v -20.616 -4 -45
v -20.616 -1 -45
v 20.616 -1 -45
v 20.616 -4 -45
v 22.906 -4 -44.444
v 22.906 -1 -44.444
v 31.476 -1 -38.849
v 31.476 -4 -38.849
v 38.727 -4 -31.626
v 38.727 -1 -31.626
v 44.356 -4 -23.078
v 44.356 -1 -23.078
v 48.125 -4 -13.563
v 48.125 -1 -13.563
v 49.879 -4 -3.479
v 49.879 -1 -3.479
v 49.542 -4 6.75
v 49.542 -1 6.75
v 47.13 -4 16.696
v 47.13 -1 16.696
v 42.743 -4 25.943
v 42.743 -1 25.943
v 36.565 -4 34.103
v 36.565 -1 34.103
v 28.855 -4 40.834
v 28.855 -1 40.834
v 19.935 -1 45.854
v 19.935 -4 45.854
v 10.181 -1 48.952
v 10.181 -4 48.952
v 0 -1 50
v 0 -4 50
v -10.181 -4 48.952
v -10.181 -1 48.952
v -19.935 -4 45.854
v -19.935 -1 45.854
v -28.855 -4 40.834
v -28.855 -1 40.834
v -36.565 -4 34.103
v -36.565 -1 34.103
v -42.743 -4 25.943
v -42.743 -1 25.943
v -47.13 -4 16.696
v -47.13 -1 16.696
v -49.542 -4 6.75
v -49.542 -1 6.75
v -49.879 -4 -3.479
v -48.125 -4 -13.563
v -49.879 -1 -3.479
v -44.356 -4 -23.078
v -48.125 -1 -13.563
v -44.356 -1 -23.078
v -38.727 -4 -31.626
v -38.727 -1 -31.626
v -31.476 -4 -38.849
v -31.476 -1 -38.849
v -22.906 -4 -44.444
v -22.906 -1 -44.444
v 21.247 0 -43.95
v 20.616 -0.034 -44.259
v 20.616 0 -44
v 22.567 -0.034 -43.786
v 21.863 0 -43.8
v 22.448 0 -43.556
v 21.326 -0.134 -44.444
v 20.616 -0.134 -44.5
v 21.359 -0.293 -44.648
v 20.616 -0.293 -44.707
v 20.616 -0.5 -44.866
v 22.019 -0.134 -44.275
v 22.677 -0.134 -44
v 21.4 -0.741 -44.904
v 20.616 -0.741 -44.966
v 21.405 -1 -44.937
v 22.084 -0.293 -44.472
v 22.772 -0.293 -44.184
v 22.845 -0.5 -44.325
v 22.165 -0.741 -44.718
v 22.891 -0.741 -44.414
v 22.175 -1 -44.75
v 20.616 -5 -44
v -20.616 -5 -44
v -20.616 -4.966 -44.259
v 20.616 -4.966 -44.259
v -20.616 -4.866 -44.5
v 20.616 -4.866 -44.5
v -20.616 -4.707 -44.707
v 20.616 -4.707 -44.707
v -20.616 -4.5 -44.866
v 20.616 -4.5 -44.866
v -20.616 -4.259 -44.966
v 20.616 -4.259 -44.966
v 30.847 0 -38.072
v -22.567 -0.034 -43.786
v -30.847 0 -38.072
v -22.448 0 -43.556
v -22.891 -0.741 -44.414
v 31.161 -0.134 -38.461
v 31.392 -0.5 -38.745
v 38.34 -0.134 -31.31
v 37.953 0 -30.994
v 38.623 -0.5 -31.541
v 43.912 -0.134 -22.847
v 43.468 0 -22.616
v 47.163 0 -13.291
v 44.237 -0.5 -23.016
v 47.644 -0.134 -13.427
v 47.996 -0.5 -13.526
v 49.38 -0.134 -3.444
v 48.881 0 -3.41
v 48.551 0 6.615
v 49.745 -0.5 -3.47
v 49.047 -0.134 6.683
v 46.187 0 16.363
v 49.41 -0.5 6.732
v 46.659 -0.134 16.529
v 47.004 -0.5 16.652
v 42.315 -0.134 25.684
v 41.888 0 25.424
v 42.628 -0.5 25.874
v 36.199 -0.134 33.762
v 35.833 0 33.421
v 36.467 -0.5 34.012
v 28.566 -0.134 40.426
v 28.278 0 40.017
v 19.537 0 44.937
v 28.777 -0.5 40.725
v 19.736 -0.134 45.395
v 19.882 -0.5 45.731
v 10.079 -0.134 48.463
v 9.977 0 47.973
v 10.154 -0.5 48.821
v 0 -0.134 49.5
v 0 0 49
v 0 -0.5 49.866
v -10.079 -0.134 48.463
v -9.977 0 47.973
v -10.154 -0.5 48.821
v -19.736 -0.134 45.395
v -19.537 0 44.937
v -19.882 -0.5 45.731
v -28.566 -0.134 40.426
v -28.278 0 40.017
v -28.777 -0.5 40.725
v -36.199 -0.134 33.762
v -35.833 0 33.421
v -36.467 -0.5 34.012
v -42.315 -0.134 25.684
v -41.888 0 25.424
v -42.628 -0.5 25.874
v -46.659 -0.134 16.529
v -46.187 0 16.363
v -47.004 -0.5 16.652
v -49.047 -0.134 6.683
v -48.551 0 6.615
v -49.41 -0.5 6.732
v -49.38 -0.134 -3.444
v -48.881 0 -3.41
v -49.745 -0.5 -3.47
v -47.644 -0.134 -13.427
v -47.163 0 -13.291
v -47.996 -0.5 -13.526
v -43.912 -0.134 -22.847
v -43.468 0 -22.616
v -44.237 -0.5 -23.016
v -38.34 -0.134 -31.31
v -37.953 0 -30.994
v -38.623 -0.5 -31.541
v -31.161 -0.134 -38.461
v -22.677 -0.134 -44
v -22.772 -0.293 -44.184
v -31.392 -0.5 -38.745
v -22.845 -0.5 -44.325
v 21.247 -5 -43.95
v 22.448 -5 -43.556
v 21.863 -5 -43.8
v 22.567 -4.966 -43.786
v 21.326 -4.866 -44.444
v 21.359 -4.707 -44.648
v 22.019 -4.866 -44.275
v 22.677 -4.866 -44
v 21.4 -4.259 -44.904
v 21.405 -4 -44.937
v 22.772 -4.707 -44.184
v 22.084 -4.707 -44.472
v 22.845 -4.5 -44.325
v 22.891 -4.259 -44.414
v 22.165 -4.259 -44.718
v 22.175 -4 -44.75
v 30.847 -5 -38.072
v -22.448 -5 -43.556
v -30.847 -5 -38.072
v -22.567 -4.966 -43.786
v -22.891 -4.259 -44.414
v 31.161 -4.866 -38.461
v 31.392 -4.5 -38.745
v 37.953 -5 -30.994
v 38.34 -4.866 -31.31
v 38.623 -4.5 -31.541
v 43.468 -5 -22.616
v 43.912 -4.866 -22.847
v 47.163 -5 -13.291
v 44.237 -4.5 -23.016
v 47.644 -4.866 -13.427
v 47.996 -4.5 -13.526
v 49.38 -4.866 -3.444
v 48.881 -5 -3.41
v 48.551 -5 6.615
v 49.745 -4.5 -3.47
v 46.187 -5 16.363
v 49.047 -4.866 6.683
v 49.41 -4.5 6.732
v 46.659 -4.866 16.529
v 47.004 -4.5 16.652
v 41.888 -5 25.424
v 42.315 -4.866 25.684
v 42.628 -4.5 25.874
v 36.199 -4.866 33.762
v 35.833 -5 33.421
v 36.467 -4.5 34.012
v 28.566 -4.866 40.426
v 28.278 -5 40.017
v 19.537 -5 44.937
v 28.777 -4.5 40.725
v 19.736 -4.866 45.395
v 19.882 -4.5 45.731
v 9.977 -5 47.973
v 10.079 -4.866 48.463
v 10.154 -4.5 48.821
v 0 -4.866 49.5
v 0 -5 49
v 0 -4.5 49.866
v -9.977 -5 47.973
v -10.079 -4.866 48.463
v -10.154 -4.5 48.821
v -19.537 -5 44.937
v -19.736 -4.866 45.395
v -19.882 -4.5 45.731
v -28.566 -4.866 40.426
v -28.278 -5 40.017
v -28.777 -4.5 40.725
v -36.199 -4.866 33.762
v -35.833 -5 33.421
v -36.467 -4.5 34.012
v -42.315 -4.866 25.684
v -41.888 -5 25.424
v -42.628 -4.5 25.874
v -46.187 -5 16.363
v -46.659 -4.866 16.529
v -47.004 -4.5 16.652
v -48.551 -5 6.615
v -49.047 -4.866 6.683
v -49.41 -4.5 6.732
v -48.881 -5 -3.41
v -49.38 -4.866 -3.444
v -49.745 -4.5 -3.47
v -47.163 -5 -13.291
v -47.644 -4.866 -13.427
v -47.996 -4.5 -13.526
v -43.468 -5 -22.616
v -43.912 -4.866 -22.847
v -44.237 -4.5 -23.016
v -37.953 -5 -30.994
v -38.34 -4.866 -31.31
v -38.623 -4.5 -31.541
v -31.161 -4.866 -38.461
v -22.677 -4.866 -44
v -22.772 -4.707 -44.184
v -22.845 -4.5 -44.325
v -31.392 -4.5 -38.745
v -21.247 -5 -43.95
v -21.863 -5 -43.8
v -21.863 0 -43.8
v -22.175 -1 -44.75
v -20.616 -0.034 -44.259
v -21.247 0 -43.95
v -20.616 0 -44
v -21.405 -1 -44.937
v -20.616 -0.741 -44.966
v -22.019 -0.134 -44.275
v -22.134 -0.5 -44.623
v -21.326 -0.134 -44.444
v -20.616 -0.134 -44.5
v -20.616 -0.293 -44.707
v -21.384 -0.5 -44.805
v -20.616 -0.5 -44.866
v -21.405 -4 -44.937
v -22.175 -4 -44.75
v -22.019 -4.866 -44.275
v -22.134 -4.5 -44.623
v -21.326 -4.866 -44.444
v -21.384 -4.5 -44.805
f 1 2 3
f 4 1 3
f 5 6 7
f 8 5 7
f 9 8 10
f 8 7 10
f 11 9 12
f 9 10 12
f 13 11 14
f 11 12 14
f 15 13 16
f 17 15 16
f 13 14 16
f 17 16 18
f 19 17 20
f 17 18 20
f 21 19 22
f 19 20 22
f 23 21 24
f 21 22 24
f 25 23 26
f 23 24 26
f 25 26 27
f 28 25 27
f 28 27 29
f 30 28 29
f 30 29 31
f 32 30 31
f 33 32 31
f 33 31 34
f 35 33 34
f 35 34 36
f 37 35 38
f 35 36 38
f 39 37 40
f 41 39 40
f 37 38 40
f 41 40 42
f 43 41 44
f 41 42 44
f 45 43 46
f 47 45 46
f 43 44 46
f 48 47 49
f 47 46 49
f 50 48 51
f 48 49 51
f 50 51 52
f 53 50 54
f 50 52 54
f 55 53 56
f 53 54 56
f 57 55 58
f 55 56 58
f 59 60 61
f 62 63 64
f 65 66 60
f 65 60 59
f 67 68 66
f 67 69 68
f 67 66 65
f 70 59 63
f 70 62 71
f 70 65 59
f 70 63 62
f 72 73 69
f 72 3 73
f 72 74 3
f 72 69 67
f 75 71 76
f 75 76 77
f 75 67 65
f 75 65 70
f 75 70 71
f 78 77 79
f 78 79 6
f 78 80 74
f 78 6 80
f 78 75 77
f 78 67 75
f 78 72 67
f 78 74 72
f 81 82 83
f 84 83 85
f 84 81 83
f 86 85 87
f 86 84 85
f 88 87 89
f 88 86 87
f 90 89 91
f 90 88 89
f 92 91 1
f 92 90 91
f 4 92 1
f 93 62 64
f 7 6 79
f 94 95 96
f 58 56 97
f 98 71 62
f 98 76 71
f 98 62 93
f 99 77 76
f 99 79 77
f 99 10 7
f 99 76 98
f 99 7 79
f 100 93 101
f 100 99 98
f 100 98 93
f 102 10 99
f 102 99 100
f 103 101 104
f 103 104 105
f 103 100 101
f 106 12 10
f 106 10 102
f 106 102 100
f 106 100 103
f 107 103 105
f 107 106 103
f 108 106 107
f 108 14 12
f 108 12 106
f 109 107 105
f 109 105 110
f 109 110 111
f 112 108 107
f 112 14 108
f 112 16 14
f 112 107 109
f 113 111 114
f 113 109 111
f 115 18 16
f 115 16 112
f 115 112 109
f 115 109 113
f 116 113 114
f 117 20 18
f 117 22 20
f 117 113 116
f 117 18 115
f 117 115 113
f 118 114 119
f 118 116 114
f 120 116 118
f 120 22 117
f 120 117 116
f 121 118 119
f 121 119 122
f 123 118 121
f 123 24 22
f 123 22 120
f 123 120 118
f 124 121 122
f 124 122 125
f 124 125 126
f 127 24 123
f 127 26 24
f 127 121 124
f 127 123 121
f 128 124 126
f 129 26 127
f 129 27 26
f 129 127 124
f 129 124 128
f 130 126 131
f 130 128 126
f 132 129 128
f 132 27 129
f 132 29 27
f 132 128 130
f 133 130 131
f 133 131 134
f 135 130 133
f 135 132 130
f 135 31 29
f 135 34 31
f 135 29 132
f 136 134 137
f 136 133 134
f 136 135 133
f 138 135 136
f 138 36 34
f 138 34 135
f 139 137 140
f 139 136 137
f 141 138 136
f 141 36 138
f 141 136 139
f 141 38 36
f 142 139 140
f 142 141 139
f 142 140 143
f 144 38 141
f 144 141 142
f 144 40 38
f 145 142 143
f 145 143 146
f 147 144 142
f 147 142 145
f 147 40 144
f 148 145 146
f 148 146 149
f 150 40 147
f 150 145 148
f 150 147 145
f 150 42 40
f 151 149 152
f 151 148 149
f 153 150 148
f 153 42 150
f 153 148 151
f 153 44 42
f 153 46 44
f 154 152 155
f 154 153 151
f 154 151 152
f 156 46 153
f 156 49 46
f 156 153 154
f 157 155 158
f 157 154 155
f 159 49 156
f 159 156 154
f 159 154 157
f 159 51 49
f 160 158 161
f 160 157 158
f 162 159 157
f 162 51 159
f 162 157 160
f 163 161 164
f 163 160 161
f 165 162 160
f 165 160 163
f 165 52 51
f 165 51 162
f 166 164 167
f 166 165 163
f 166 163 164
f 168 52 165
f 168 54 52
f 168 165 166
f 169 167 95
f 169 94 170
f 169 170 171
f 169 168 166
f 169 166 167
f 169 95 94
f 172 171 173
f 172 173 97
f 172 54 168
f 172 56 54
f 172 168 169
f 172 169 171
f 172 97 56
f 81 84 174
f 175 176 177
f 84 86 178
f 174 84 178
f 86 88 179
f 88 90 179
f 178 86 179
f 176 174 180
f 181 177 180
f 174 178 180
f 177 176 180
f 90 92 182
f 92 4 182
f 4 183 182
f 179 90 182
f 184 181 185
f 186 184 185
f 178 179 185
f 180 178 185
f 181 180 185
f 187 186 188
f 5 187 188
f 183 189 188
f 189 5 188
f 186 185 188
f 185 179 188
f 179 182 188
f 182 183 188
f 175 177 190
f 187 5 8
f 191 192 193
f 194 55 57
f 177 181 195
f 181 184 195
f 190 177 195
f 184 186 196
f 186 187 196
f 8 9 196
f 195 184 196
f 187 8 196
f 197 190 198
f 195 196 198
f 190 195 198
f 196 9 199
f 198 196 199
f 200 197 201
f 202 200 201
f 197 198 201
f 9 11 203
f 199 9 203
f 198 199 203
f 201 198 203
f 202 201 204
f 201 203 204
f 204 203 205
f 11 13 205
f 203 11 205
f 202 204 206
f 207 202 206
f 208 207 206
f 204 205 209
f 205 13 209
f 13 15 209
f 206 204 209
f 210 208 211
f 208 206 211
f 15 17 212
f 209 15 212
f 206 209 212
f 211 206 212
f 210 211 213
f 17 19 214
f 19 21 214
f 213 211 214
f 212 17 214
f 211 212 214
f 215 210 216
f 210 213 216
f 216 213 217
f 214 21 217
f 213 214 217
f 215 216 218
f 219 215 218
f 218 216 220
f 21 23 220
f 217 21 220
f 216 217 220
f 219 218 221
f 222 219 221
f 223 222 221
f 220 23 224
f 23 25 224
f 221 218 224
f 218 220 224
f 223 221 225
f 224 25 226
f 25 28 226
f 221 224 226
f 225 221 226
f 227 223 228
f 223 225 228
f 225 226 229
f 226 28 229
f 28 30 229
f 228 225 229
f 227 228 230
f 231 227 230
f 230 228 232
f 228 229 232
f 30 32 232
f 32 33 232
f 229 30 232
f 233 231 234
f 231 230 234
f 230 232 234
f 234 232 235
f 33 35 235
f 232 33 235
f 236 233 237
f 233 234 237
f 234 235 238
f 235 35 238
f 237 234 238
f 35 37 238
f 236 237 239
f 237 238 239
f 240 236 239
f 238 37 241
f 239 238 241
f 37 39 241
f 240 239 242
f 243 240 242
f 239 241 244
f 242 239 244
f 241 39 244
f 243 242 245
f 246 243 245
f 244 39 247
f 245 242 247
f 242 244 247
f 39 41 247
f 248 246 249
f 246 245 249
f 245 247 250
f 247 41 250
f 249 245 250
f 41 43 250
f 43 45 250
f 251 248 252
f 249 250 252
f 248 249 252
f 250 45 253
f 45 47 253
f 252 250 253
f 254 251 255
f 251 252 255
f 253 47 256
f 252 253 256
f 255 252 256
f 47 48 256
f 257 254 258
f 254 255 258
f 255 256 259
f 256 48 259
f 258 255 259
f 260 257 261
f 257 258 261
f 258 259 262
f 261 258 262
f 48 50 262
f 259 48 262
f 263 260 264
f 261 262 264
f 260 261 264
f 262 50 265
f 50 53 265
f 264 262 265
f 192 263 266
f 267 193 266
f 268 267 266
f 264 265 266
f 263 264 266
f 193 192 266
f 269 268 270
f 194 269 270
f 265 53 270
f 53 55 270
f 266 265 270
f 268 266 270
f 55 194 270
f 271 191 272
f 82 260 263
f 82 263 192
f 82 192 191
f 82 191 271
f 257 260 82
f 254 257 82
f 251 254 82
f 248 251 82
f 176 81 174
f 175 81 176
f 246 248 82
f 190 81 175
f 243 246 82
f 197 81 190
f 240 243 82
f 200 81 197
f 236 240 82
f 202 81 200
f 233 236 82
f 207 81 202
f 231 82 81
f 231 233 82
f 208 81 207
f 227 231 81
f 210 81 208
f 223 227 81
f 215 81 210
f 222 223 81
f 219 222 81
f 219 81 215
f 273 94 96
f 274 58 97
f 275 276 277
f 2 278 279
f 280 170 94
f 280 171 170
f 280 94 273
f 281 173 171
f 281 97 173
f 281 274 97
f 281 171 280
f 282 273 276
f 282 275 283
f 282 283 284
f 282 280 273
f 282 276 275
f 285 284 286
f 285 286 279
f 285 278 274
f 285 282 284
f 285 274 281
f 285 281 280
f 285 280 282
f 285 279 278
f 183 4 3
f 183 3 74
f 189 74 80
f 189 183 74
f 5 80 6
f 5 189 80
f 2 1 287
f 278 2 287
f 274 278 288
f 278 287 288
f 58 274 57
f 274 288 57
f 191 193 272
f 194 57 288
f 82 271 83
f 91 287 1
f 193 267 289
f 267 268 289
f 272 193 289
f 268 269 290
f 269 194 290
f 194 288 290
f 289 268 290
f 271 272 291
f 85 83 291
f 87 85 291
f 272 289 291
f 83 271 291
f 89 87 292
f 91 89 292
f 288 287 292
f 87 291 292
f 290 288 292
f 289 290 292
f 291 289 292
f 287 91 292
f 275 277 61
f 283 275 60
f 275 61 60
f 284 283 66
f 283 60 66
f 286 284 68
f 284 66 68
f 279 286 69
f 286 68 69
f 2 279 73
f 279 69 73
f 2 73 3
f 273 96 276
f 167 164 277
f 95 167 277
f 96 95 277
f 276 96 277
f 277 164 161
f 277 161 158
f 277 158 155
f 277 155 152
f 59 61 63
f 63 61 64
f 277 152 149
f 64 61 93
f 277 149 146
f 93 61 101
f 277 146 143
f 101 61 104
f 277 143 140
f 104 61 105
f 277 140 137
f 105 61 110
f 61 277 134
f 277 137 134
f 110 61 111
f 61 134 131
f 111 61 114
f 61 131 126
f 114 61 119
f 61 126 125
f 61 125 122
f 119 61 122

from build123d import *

# Parameters (mm, degrees)
F1_DEPTH = 5
F2_R     = 5
F3_R     = 1


with BuildPart() as f1:
    # F0 (on Front) → F1 (new body)
    with BuildSketch(Plane.XZ):
        with BuildLine():
            Line((-21.7944947177, -45), (21.7944947177, -45))
            ThreePointArc((21.7944947177, -45), (0, 50), (-21.7944947177, -45))
        make_face()
    extrude(amount=F1_DEPTH)

    # F2
    f2_edges = [f1.edges().sort_by_distance(p)[0] for p in [
        (21.794495, -2.5, -45),
        (-21.794495, -2.5, -45),
    ]]
    fillet(f2_edges, radius=F2_R)

    # F3
    f3_edges = [f1.edges().sort_by_distance(p)[0] for p in [
        (0, -5, 50),
        (0, 0, 50),
        (0, -5, -45),
        (0, 0, -45),
        (-21.794039, 0, -44.859127),
        (21.794039, 0, -44.859127),
        (-21.794039, -5, -44.859127),
        (21.794039, -5, -44.859127),
    ]]
    fillet(f3_edges, radius=F3_R)


solid = f1.part
